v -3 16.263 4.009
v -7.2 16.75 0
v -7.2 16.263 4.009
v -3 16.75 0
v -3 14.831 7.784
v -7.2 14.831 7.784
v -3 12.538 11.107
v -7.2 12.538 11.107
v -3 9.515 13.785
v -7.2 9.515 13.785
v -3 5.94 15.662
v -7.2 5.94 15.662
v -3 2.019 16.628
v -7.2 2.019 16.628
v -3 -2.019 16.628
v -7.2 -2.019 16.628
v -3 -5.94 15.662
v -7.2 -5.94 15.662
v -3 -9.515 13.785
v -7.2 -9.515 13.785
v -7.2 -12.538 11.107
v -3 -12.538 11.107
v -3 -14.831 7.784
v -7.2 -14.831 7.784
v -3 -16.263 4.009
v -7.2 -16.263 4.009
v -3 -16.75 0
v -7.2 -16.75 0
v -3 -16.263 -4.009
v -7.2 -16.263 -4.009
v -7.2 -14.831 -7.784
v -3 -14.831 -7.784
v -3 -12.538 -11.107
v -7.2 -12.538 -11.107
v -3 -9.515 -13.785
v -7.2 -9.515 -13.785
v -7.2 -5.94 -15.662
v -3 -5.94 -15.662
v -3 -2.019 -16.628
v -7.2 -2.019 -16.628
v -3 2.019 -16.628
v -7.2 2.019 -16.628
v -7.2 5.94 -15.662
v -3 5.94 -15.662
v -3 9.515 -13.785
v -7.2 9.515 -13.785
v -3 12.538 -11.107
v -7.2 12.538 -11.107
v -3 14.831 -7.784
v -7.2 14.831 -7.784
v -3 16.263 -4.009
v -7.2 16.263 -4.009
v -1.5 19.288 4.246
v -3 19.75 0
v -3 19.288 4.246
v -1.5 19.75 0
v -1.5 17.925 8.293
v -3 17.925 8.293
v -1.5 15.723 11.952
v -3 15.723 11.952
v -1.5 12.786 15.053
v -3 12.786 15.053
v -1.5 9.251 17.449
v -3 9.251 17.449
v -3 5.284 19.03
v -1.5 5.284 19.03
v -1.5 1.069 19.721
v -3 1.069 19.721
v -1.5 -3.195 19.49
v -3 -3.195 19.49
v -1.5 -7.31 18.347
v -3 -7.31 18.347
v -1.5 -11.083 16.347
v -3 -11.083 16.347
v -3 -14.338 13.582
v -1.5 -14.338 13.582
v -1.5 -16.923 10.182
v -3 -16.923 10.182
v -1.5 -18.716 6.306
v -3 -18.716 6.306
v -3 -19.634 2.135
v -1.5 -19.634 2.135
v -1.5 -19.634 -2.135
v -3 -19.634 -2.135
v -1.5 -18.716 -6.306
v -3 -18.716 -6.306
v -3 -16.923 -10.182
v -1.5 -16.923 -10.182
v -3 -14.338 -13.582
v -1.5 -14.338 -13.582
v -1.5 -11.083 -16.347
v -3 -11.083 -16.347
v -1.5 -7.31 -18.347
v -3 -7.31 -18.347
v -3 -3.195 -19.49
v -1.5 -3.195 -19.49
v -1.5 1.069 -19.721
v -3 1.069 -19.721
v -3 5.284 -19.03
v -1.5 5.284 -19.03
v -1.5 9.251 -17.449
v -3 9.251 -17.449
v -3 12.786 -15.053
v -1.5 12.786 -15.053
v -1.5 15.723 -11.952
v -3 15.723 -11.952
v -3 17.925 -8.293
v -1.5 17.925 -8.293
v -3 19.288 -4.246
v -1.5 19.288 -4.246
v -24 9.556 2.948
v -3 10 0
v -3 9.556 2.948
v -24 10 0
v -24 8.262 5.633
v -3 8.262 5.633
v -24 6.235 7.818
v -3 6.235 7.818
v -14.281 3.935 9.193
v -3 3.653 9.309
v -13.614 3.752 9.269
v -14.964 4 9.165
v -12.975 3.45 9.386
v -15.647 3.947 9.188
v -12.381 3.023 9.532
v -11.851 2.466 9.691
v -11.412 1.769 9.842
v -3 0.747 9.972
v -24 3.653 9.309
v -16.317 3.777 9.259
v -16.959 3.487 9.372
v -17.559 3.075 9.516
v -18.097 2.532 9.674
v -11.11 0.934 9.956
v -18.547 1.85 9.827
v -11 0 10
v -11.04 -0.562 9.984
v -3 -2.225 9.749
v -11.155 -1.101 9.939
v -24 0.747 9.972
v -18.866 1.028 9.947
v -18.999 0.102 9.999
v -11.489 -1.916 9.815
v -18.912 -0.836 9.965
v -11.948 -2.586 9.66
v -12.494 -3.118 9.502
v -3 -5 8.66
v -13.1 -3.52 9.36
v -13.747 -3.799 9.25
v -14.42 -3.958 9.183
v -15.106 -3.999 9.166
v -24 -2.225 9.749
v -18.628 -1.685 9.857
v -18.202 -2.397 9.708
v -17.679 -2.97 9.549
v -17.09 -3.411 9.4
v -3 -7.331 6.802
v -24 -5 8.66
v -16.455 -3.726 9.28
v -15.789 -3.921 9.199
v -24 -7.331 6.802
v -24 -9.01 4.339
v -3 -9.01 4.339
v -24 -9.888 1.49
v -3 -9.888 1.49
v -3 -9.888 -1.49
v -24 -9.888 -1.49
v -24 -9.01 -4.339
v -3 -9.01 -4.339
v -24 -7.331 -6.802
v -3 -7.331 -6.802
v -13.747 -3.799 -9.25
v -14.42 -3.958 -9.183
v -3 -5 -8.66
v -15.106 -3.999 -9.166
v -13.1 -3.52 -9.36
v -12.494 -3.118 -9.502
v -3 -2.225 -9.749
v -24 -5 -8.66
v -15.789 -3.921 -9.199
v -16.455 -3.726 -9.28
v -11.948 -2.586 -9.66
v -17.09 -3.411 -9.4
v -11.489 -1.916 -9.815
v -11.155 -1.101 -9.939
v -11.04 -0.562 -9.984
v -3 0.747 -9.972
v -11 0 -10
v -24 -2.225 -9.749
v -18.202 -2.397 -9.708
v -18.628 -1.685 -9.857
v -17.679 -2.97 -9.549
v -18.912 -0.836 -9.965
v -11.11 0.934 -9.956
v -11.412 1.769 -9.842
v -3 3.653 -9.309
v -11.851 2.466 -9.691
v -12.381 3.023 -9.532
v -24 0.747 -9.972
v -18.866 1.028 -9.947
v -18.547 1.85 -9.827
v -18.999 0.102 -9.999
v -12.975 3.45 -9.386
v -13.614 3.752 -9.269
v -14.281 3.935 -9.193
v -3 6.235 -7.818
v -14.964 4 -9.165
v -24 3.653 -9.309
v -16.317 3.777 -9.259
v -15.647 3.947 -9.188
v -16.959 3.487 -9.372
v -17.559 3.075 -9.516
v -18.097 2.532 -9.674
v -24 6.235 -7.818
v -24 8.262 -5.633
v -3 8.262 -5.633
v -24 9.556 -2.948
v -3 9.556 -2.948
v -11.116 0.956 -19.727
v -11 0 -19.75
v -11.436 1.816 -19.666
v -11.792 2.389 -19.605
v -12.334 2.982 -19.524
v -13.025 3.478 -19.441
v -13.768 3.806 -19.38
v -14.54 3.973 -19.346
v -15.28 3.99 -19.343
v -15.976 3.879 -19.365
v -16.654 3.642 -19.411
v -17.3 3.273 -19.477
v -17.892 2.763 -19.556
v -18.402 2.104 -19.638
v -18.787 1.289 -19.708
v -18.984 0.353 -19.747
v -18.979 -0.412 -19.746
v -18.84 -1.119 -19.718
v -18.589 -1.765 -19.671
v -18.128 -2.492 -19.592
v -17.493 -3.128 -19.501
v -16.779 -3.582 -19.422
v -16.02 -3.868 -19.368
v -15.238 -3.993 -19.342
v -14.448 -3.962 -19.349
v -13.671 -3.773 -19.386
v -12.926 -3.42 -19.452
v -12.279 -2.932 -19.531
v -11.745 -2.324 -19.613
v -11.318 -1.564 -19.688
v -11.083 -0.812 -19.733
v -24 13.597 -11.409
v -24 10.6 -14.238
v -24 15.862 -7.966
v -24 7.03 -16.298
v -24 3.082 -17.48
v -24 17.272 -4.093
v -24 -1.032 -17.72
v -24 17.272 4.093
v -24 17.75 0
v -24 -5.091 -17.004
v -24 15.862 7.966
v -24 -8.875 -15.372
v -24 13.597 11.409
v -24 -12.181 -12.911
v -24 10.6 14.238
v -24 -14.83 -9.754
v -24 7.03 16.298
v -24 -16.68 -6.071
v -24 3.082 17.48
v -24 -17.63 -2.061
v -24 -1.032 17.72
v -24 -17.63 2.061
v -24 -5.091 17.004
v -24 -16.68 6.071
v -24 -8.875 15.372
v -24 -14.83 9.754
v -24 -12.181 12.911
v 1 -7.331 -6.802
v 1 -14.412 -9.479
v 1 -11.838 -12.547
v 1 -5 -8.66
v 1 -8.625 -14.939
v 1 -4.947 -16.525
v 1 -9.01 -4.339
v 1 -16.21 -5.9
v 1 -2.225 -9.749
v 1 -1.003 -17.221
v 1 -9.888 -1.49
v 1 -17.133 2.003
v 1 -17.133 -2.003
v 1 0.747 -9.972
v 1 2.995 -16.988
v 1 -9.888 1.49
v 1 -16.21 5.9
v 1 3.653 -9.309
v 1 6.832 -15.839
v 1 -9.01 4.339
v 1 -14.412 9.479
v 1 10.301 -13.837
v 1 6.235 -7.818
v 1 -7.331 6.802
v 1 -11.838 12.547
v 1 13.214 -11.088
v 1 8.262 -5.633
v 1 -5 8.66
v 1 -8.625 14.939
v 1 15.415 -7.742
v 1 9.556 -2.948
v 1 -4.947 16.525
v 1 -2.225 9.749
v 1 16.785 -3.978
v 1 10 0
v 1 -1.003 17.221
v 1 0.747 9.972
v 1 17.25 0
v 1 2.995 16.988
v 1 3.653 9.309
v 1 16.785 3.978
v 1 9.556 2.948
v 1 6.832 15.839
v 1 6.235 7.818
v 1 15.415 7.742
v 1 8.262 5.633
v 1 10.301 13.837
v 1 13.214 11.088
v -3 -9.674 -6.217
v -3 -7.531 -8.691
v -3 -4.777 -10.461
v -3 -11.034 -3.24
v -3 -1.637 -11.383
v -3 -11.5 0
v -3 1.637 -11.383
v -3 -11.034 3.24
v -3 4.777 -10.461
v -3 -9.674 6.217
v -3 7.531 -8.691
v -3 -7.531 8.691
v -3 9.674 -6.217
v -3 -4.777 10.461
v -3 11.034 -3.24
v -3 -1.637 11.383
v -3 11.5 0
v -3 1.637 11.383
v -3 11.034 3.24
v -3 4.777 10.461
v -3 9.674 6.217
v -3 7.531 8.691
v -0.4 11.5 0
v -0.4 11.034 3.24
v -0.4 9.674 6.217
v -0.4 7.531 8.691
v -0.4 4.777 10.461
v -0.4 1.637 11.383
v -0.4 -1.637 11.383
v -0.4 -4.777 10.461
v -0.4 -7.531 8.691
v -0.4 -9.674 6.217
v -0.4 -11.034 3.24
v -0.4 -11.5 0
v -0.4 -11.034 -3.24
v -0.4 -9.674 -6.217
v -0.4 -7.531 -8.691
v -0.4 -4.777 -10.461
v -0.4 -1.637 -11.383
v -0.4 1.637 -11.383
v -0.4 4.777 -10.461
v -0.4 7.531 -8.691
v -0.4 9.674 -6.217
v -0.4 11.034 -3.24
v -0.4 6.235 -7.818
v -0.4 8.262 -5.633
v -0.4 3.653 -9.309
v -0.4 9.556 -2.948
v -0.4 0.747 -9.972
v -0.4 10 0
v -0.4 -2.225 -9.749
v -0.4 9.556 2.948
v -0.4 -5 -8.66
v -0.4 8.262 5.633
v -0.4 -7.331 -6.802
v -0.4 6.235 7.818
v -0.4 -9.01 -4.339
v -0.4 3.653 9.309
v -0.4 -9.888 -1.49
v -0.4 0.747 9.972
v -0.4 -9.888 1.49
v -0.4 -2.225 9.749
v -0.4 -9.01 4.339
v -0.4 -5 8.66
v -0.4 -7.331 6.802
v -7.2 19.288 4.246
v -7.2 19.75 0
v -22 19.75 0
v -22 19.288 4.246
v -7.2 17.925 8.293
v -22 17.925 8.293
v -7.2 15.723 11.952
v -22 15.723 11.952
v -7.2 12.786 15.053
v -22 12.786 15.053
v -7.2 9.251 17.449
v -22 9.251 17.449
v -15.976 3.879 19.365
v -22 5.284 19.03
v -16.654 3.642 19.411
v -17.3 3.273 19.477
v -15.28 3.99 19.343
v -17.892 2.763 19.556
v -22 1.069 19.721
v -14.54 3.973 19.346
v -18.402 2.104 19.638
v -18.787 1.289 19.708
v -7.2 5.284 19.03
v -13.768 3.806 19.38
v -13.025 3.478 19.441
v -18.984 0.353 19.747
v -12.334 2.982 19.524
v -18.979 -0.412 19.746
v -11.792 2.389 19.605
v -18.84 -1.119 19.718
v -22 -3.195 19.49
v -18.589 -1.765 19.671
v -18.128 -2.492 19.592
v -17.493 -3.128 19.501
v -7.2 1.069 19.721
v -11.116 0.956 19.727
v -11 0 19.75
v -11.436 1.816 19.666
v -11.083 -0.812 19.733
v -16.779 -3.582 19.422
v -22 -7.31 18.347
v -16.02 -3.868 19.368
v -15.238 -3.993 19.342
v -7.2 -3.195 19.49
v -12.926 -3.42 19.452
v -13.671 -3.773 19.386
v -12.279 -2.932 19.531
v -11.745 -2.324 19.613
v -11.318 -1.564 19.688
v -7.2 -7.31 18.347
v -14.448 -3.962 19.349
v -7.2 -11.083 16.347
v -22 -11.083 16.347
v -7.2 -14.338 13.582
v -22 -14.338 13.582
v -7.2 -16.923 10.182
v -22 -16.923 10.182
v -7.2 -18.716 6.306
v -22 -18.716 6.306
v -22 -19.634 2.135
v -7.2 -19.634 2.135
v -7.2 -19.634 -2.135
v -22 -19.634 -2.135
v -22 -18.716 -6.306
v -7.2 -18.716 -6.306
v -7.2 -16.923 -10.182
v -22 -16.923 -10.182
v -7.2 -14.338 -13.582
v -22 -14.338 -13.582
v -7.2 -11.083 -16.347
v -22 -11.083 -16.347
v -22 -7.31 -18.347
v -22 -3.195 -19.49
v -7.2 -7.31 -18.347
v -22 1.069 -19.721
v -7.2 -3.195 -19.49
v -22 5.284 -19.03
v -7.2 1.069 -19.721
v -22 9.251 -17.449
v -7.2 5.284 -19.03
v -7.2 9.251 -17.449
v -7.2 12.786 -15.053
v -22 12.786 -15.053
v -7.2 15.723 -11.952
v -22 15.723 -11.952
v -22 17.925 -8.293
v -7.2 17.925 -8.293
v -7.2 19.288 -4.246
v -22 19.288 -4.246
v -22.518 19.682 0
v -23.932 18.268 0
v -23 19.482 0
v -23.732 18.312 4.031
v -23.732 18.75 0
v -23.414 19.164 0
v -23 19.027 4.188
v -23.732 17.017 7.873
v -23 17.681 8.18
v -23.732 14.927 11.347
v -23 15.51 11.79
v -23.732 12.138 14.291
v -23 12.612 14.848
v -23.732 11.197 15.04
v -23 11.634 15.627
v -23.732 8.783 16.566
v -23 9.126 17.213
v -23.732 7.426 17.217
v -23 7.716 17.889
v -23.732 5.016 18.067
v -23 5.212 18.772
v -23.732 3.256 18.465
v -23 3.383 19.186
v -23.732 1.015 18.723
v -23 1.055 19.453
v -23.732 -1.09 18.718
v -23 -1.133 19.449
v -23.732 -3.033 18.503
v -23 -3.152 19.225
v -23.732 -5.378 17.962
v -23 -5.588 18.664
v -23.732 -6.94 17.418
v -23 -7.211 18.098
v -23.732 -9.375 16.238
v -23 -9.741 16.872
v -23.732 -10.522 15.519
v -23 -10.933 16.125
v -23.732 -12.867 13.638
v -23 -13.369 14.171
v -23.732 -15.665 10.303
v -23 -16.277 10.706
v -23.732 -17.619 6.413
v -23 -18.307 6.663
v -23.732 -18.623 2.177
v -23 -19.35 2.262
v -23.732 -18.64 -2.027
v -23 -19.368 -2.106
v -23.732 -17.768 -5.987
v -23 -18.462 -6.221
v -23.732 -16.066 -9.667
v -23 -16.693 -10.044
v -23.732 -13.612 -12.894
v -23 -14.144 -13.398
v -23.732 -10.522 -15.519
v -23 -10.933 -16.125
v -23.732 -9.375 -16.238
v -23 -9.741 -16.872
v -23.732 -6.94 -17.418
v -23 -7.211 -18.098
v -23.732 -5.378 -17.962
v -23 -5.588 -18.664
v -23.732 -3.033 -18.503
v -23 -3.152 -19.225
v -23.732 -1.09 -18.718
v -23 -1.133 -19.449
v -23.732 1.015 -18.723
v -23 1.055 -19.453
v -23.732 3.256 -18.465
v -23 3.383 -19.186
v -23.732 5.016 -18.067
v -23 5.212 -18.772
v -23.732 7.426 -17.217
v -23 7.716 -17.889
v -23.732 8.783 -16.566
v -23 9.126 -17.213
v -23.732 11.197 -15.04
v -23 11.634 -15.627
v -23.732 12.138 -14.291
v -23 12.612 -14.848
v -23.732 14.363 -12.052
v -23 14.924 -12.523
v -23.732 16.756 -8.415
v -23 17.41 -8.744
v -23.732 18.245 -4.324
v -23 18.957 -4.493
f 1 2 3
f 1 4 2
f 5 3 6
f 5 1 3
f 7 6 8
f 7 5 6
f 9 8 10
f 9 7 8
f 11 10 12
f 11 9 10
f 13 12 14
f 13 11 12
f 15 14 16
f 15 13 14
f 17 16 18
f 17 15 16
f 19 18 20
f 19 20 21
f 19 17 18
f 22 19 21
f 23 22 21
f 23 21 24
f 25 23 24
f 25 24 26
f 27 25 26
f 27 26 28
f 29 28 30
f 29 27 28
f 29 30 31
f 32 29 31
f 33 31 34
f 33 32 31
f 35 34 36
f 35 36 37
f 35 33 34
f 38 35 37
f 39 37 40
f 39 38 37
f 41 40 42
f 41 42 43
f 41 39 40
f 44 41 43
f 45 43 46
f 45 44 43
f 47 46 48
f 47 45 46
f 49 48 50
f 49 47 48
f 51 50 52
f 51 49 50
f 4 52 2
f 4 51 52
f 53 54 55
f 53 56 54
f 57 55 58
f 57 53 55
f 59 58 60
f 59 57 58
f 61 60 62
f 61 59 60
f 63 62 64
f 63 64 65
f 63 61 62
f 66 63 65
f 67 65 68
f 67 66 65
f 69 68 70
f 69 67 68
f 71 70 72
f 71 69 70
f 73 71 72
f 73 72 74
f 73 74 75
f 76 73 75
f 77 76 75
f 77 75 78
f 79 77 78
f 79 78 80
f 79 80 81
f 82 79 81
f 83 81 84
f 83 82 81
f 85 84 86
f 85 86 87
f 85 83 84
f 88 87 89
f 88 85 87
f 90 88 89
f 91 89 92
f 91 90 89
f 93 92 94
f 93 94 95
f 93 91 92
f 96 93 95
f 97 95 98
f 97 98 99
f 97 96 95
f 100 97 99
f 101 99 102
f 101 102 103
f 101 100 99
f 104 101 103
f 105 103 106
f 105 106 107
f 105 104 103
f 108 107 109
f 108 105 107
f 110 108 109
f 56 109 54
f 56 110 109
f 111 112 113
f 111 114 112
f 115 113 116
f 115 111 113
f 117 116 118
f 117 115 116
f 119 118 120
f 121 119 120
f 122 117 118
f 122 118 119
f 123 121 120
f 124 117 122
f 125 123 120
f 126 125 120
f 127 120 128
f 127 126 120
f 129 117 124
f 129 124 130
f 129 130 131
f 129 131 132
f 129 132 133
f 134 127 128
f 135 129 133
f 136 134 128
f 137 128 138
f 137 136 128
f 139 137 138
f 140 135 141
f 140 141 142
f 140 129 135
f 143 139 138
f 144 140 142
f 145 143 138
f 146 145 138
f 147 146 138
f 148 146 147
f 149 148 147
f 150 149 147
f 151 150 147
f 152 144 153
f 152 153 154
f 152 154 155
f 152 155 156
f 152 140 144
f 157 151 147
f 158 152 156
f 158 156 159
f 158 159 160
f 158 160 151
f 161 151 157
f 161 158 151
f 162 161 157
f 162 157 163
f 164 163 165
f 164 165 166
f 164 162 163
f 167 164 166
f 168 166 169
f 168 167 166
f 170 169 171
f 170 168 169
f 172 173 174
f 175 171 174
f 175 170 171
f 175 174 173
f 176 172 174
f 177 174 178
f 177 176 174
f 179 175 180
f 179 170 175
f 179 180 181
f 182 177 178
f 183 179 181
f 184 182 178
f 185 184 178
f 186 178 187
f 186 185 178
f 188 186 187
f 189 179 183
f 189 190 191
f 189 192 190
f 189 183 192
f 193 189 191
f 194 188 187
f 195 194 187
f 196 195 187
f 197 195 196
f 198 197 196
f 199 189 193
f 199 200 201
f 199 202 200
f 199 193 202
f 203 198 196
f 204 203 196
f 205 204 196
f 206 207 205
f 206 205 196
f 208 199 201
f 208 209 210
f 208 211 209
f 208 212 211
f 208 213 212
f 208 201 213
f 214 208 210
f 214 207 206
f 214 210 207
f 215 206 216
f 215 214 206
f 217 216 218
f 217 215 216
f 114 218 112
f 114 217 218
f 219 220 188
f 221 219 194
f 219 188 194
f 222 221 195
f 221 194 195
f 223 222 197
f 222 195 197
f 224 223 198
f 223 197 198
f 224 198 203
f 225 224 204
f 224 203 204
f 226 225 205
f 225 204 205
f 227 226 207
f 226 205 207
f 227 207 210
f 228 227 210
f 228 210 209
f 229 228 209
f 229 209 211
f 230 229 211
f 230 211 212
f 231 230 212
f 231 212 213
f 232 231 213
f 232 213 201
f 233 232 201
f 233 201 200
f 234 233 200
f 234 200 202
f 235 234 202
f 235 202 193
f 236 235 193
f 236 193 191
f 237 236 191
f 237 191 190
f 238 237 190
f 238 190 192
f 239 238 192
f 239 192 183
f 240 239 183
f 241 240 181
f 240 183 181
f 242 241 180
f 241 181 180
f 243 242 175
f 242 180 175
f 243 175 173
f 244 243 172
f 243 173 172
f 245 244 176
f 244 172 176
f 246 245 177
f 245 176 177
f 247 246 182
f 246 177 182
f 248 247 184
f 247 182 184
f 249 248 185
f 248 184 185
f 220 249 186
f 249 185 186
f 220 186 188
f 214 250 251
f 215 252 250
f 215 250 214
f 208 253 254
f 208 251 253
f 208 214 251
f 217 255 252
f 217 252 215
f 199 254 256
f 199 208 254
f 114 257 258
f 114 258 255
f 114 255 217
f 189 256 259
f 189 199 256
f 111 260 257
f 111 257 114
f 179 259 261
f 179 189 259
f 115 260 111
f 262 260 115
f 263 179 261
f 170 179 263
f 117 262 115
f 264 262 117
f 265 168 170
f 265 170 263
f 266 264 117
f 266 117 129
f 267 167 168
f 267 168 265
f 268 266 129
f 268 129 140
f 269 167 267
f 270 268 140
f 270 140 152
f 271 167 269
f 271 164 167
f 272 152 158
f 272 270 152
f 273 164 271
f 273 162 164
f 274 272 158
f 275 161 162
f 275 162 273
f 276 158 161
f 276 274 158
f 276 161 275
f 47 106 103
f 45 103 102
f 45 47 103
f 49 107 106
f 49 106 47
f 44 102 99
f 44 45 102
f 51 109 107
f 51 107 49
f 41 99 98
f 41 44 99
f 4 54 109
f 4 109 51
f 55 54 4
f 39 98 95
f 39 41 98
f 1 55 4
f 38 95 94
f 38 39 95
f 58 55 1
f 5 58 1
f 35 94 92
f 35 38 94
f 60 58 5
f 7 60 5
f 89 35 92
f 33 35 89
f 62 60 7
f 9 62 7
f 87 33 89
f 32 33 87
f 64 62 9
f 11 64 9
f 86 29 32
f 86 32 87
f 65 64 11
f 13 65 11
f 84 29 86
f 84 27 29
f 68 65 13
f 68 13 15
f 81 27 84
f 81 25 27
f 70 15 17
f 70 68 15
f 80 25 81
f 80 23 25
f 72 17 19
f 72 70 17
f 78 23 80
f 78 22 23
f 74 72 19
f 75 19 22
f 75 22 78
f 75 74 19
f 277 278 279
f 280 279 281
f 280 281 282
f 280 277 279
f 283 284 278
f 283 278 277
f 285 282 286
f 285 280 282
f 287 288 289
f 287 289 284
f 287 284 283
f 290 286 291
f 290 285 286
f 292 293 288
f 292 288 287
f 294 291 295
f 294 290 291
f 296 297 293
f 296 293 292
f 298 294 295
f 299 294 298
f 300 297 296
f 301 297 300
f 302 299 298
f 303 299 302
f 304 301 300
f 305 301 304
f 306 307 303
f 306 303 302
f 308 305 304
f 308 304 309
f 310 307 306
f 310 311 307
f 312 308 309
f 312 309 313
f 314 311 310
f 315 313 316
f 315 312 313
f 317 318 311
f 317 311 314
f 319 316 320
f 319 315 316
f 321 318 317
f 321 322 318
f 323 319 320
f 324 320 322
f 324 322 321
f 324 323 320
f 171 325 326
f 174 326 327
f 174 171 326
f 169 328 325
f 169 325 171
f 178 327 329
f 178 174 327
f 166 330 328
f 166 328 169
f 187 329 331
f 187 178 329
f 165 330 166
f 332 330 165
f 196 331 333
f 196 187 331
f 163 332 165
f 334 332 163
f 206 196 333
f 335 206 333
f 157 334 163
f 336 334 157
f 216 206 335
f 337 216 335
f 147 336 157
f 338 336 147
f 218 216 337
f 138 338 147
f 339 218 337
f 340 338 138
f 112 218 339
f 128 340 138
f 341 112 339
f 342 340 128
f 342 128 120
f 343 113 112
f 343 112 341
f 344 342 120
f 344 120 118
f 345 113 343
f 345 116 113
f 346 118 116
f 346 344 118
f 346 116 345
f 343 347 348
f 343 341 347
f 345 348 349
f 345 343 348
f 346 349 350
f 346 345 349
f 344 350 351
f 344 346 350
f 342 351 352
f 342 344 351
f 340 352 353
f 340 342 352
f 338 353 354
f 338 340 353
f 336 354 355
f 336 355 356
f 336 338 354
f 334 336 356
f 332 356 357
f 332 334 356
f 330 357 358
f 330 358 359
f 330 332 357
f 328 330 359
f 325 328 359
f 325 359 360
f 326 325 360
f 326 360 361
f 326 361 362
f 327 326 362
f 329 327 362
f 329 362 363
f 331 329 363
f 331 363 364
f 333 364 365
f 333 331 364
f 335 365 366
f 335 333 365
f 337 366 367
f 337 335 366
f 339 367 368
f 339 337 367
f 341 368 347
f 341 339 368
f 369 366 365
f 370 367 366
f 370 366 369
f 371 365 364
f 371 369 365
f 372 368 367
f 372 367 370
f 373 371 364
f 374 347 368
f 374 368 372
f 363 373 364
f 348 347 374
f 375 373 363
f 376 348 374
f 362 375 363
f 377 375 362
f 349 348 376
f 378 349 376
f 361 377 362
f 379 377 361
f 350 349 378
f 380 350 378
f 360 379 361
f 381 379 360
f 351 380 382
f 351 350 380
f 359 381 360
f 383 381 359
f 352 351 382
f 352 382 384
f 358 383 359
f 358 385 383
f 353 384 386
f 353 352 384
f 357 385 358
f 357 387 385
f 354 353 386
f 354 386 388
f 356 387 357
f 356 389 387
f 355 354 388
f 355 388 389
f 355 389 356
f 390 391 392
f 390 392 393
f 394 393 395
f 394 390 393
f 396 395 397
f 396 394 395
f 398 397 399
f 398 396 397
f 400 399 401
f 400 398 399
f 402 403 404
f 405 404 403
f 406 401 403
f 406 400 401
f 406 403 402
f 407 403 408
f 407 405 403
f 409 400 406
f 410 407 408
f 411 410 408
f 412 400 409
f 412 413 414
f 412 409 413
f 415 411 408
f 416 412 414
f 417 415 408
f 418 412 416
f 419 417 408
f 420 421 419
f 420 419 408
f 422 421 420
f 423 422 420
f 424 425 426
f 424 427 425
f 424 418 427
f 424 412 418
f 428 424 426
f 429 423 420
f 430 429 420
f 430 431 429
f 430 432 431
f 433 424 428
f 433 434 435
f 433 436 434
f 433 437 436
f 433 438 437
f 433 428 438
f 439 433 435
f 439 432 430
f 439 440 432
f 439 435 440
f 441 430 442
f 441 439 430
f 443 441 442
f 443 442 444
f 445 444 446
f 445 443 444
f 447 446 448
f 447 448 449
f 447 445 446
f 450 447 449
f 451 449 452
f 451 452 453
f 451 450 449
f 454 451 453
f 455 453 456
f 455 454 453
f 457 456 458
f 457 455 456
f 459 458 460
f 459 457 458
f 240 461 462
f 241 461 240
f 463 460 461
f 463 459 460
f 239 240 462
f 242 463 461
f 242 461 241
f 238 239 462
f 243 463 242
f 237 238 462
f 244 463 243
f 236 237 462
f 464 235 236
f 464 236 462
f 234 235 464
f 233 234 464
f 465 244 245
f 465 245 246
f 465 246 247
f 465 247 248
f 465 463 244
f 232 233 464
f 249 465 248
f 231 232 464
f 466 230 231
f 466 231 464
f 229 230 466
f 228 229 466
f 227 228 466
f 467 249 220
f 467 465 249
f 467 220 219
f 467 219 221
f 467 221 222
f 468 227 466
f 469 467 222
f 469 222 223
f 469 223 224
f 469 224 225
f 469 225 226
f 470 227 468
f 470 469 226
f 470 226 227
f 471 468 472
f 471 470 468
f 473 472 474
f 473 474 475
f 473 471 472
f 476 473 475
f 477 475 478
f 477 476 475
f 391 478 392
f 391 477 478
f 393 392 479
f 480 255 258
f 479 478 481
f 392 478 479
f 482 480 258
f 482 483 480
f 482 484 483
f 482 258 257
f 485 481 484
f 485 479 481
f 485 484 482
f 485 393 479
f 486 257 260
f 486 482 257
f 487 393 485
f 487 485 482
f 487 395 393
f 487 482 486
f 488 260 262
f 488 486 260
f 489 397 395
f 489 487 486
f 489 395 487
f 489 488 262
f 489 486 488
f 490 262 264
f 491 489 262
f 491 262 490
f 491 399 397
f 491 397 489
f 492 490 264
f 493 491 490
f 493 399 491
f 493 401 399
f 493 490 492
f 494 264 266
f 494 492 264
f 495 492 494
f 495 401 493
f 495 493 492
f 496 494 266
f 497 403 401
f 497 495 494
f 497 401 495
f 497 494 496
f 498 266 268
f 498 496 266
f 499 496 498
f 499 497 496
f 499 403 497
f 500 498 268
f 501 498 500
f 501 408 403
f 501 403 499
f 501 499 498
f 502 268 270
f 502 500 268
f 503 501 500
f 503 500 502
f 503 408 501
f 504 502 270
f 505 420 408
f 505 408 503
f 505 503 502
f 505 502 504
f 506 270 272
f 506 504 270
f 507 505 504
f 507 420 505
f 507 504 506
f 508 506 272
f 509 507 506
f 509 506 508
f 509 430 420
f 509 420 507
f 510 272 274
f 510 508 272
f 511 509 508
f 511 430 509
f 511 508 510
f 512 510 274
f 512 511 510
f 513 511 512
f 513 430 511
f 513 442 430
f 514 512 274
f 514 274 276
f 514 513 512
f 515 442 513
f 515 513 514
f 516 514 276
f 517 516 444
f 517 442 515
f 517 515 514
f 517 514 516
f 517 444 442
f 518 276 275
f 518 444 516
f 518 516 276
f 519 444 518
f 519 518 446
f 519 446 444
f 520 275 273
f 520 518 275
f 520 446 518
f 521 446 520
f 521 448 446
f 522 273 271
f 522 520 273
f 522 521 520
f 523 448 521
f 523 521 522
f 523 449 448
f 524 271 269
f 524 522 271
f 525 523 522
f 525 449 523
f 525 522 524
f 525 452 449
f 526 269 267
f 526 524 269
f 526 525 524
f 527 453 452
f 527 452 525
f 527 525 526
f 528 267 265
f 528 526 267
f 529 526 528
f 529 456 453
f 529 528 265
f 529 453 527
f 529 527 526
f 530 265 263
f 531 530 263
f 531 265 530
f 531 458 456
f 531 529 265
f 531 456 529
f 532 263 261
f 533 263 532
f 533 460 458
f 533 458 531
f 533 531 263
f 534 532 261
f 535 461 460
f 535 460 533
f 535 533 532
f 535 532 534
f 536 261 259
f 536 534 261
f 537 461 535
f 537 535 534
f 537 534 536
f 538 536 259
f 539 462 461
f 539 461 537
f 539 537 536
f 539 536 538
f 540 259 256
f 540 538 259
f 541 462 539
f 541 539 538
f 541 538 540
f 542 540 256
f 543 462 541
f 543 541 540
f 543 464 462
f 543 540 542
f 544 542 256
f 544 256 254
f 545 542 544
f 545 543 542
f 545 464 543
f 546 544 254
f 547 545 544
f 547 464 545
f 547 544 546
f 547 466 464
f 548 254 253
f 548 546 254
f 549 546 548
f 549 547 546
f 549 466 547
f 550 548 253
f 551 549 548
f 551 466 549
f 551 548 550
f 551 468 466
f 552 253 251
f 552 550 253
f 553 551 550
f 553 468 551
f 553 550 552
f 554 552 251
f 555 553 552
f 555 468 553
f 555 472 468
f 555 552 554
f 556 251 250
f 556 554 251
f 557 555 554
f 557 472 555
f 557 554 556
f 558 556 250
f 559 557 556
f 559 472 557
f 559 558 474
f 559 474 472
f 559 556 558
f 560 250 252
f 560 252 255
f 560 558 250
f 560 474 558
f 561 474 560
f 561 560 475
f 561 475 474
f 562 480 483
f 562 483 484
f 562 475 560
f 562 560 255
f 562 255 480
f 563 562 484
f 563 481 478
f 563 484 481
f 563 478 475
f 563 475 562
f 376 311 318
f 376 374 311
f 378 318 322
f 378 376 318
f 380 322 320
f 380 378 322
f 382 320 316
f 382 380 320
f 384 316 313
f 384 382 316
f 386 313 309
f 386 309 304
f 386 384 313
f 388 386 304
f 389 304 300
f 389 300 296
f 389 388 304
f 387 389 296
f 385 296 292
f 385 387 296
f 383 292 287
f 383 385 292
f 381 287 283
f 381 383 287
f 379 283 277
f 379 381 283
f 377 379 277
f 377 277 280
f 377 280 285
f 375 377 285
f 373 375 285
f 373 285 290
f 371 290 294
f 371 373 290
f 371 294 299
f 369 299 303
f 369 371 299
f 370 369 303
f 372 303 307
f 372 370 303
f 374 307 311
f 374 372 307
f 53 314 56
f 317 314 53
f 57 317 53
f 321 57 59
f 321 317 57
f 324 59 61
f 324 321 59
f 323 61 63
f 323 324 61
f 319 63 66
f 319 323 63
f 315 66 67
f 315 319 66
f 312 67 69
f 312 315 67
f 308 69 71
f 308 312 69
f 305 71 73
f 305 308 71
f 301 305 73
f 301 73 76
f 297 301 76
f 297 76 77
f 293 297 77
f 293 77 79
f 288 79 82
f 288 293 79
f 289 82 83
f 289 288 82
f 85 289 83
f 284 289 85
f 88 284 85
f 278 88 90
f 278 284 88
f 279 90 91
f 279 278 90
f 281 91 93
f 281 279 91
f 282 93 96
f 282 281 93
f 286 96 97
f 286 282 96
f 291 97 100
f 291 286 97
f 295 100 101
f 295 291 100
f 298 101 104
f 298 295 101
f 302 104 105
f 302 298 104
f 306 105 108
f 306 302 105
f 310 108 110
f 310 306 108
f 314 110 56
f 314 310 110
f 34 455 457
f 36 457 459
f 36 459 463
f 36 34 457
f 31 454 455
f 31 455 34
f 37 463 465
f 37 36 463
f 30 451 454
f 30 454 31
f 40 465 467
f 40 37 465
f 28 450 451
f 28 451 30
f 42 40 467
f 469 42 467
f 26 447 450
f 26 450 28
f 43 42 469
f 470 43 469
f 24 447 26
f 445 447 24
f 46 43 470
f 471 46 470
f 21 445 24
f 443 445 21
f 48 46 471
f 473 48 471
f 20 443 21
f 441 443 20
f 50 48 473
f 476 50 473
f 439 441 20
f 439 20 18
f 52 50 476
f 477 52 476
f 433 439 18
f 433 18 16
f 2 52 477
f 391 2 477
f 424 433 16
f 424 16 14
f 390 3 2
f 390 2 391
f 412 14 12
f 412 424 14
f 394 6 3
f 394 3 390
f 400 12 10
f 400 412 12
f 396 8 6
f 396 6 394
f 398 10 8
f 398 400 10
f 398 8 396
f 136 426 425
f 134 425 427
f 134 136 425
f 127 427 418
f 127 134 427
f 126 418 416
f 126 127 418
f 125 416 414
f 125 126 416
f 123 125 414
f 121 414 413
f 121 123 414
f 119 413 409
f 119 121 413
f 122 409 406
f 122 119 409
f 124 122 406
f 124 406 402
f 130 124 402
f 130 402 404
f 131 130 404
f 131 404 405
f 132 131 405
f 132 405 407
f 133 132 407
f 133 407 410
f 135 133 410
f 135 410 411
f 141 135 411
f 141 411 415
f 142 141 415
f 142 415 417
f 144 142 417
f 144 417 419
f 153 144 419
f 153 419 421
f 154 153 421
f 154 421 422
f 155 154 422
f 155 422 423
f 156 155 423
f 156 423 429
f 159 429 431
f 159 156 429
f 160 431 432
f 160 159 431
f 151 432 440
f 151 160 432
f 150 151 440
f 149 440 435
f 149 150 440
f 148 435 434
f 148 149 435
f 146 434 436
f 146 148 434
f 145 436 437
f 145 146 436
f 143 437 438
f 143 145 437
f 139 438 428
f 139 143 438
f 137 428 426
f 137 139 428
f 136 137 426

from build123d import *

# Parameters (mm, degrees)
ESQUISSE2_R                  = 4
ENL_V_MAT_EXTRU_1_DEPTH      = 20.75
ENL_V_MAT_EXTRU_1_DEPTH_BACK = 20.75
CONG_2_R                     = 2


with BuildPart() as part:
    # Esquisse1 → Base-Révolution (revolve)
    with BuildSketch(Plane.XY):
        Polygon((-24, 10), (-24, 19.75), (-7.2, 19.75), (-7.2, 16.75), (-3, 16.75), (-3, 19.75), (-1.5, 19.75), (1, 17.25), (1, 10), (-0.4, 10), (-0.4, 11.5), (-3, 11.5), (-3, 10), align=None)
    revolve(axis=Axis((-92, 0, 0), (1, 0, 0)))

    # Esquisse2 → Enlèv. mat.-Extru.1 (cut, two sides)
    with BuildSketch(Plane.XY) as enl_v_mat_extru_1_sk:
        with Locations((-15, 0)):
            Circle(ESQUISSE2_R)
    extrude(amount=ENL_V_MAT_EXTRU_1_DEPTH, mode=Mode.SUBTRACT)
    extrude(enl_v_mat_extru_1_sk.sketch, amount=-ENL_V_MAT_EXTRU_1_DEPTH_BACK, mode=Mode.SUBTRACT)

    # Congé2
    cong_2_edges = [part.edges().sort_by_distance(p)[0] for p in [
        (-24, -19.75, 0),
    ]]
    fillet(cong_2_edges, radius=CONG_2_R)


solid = part.part
